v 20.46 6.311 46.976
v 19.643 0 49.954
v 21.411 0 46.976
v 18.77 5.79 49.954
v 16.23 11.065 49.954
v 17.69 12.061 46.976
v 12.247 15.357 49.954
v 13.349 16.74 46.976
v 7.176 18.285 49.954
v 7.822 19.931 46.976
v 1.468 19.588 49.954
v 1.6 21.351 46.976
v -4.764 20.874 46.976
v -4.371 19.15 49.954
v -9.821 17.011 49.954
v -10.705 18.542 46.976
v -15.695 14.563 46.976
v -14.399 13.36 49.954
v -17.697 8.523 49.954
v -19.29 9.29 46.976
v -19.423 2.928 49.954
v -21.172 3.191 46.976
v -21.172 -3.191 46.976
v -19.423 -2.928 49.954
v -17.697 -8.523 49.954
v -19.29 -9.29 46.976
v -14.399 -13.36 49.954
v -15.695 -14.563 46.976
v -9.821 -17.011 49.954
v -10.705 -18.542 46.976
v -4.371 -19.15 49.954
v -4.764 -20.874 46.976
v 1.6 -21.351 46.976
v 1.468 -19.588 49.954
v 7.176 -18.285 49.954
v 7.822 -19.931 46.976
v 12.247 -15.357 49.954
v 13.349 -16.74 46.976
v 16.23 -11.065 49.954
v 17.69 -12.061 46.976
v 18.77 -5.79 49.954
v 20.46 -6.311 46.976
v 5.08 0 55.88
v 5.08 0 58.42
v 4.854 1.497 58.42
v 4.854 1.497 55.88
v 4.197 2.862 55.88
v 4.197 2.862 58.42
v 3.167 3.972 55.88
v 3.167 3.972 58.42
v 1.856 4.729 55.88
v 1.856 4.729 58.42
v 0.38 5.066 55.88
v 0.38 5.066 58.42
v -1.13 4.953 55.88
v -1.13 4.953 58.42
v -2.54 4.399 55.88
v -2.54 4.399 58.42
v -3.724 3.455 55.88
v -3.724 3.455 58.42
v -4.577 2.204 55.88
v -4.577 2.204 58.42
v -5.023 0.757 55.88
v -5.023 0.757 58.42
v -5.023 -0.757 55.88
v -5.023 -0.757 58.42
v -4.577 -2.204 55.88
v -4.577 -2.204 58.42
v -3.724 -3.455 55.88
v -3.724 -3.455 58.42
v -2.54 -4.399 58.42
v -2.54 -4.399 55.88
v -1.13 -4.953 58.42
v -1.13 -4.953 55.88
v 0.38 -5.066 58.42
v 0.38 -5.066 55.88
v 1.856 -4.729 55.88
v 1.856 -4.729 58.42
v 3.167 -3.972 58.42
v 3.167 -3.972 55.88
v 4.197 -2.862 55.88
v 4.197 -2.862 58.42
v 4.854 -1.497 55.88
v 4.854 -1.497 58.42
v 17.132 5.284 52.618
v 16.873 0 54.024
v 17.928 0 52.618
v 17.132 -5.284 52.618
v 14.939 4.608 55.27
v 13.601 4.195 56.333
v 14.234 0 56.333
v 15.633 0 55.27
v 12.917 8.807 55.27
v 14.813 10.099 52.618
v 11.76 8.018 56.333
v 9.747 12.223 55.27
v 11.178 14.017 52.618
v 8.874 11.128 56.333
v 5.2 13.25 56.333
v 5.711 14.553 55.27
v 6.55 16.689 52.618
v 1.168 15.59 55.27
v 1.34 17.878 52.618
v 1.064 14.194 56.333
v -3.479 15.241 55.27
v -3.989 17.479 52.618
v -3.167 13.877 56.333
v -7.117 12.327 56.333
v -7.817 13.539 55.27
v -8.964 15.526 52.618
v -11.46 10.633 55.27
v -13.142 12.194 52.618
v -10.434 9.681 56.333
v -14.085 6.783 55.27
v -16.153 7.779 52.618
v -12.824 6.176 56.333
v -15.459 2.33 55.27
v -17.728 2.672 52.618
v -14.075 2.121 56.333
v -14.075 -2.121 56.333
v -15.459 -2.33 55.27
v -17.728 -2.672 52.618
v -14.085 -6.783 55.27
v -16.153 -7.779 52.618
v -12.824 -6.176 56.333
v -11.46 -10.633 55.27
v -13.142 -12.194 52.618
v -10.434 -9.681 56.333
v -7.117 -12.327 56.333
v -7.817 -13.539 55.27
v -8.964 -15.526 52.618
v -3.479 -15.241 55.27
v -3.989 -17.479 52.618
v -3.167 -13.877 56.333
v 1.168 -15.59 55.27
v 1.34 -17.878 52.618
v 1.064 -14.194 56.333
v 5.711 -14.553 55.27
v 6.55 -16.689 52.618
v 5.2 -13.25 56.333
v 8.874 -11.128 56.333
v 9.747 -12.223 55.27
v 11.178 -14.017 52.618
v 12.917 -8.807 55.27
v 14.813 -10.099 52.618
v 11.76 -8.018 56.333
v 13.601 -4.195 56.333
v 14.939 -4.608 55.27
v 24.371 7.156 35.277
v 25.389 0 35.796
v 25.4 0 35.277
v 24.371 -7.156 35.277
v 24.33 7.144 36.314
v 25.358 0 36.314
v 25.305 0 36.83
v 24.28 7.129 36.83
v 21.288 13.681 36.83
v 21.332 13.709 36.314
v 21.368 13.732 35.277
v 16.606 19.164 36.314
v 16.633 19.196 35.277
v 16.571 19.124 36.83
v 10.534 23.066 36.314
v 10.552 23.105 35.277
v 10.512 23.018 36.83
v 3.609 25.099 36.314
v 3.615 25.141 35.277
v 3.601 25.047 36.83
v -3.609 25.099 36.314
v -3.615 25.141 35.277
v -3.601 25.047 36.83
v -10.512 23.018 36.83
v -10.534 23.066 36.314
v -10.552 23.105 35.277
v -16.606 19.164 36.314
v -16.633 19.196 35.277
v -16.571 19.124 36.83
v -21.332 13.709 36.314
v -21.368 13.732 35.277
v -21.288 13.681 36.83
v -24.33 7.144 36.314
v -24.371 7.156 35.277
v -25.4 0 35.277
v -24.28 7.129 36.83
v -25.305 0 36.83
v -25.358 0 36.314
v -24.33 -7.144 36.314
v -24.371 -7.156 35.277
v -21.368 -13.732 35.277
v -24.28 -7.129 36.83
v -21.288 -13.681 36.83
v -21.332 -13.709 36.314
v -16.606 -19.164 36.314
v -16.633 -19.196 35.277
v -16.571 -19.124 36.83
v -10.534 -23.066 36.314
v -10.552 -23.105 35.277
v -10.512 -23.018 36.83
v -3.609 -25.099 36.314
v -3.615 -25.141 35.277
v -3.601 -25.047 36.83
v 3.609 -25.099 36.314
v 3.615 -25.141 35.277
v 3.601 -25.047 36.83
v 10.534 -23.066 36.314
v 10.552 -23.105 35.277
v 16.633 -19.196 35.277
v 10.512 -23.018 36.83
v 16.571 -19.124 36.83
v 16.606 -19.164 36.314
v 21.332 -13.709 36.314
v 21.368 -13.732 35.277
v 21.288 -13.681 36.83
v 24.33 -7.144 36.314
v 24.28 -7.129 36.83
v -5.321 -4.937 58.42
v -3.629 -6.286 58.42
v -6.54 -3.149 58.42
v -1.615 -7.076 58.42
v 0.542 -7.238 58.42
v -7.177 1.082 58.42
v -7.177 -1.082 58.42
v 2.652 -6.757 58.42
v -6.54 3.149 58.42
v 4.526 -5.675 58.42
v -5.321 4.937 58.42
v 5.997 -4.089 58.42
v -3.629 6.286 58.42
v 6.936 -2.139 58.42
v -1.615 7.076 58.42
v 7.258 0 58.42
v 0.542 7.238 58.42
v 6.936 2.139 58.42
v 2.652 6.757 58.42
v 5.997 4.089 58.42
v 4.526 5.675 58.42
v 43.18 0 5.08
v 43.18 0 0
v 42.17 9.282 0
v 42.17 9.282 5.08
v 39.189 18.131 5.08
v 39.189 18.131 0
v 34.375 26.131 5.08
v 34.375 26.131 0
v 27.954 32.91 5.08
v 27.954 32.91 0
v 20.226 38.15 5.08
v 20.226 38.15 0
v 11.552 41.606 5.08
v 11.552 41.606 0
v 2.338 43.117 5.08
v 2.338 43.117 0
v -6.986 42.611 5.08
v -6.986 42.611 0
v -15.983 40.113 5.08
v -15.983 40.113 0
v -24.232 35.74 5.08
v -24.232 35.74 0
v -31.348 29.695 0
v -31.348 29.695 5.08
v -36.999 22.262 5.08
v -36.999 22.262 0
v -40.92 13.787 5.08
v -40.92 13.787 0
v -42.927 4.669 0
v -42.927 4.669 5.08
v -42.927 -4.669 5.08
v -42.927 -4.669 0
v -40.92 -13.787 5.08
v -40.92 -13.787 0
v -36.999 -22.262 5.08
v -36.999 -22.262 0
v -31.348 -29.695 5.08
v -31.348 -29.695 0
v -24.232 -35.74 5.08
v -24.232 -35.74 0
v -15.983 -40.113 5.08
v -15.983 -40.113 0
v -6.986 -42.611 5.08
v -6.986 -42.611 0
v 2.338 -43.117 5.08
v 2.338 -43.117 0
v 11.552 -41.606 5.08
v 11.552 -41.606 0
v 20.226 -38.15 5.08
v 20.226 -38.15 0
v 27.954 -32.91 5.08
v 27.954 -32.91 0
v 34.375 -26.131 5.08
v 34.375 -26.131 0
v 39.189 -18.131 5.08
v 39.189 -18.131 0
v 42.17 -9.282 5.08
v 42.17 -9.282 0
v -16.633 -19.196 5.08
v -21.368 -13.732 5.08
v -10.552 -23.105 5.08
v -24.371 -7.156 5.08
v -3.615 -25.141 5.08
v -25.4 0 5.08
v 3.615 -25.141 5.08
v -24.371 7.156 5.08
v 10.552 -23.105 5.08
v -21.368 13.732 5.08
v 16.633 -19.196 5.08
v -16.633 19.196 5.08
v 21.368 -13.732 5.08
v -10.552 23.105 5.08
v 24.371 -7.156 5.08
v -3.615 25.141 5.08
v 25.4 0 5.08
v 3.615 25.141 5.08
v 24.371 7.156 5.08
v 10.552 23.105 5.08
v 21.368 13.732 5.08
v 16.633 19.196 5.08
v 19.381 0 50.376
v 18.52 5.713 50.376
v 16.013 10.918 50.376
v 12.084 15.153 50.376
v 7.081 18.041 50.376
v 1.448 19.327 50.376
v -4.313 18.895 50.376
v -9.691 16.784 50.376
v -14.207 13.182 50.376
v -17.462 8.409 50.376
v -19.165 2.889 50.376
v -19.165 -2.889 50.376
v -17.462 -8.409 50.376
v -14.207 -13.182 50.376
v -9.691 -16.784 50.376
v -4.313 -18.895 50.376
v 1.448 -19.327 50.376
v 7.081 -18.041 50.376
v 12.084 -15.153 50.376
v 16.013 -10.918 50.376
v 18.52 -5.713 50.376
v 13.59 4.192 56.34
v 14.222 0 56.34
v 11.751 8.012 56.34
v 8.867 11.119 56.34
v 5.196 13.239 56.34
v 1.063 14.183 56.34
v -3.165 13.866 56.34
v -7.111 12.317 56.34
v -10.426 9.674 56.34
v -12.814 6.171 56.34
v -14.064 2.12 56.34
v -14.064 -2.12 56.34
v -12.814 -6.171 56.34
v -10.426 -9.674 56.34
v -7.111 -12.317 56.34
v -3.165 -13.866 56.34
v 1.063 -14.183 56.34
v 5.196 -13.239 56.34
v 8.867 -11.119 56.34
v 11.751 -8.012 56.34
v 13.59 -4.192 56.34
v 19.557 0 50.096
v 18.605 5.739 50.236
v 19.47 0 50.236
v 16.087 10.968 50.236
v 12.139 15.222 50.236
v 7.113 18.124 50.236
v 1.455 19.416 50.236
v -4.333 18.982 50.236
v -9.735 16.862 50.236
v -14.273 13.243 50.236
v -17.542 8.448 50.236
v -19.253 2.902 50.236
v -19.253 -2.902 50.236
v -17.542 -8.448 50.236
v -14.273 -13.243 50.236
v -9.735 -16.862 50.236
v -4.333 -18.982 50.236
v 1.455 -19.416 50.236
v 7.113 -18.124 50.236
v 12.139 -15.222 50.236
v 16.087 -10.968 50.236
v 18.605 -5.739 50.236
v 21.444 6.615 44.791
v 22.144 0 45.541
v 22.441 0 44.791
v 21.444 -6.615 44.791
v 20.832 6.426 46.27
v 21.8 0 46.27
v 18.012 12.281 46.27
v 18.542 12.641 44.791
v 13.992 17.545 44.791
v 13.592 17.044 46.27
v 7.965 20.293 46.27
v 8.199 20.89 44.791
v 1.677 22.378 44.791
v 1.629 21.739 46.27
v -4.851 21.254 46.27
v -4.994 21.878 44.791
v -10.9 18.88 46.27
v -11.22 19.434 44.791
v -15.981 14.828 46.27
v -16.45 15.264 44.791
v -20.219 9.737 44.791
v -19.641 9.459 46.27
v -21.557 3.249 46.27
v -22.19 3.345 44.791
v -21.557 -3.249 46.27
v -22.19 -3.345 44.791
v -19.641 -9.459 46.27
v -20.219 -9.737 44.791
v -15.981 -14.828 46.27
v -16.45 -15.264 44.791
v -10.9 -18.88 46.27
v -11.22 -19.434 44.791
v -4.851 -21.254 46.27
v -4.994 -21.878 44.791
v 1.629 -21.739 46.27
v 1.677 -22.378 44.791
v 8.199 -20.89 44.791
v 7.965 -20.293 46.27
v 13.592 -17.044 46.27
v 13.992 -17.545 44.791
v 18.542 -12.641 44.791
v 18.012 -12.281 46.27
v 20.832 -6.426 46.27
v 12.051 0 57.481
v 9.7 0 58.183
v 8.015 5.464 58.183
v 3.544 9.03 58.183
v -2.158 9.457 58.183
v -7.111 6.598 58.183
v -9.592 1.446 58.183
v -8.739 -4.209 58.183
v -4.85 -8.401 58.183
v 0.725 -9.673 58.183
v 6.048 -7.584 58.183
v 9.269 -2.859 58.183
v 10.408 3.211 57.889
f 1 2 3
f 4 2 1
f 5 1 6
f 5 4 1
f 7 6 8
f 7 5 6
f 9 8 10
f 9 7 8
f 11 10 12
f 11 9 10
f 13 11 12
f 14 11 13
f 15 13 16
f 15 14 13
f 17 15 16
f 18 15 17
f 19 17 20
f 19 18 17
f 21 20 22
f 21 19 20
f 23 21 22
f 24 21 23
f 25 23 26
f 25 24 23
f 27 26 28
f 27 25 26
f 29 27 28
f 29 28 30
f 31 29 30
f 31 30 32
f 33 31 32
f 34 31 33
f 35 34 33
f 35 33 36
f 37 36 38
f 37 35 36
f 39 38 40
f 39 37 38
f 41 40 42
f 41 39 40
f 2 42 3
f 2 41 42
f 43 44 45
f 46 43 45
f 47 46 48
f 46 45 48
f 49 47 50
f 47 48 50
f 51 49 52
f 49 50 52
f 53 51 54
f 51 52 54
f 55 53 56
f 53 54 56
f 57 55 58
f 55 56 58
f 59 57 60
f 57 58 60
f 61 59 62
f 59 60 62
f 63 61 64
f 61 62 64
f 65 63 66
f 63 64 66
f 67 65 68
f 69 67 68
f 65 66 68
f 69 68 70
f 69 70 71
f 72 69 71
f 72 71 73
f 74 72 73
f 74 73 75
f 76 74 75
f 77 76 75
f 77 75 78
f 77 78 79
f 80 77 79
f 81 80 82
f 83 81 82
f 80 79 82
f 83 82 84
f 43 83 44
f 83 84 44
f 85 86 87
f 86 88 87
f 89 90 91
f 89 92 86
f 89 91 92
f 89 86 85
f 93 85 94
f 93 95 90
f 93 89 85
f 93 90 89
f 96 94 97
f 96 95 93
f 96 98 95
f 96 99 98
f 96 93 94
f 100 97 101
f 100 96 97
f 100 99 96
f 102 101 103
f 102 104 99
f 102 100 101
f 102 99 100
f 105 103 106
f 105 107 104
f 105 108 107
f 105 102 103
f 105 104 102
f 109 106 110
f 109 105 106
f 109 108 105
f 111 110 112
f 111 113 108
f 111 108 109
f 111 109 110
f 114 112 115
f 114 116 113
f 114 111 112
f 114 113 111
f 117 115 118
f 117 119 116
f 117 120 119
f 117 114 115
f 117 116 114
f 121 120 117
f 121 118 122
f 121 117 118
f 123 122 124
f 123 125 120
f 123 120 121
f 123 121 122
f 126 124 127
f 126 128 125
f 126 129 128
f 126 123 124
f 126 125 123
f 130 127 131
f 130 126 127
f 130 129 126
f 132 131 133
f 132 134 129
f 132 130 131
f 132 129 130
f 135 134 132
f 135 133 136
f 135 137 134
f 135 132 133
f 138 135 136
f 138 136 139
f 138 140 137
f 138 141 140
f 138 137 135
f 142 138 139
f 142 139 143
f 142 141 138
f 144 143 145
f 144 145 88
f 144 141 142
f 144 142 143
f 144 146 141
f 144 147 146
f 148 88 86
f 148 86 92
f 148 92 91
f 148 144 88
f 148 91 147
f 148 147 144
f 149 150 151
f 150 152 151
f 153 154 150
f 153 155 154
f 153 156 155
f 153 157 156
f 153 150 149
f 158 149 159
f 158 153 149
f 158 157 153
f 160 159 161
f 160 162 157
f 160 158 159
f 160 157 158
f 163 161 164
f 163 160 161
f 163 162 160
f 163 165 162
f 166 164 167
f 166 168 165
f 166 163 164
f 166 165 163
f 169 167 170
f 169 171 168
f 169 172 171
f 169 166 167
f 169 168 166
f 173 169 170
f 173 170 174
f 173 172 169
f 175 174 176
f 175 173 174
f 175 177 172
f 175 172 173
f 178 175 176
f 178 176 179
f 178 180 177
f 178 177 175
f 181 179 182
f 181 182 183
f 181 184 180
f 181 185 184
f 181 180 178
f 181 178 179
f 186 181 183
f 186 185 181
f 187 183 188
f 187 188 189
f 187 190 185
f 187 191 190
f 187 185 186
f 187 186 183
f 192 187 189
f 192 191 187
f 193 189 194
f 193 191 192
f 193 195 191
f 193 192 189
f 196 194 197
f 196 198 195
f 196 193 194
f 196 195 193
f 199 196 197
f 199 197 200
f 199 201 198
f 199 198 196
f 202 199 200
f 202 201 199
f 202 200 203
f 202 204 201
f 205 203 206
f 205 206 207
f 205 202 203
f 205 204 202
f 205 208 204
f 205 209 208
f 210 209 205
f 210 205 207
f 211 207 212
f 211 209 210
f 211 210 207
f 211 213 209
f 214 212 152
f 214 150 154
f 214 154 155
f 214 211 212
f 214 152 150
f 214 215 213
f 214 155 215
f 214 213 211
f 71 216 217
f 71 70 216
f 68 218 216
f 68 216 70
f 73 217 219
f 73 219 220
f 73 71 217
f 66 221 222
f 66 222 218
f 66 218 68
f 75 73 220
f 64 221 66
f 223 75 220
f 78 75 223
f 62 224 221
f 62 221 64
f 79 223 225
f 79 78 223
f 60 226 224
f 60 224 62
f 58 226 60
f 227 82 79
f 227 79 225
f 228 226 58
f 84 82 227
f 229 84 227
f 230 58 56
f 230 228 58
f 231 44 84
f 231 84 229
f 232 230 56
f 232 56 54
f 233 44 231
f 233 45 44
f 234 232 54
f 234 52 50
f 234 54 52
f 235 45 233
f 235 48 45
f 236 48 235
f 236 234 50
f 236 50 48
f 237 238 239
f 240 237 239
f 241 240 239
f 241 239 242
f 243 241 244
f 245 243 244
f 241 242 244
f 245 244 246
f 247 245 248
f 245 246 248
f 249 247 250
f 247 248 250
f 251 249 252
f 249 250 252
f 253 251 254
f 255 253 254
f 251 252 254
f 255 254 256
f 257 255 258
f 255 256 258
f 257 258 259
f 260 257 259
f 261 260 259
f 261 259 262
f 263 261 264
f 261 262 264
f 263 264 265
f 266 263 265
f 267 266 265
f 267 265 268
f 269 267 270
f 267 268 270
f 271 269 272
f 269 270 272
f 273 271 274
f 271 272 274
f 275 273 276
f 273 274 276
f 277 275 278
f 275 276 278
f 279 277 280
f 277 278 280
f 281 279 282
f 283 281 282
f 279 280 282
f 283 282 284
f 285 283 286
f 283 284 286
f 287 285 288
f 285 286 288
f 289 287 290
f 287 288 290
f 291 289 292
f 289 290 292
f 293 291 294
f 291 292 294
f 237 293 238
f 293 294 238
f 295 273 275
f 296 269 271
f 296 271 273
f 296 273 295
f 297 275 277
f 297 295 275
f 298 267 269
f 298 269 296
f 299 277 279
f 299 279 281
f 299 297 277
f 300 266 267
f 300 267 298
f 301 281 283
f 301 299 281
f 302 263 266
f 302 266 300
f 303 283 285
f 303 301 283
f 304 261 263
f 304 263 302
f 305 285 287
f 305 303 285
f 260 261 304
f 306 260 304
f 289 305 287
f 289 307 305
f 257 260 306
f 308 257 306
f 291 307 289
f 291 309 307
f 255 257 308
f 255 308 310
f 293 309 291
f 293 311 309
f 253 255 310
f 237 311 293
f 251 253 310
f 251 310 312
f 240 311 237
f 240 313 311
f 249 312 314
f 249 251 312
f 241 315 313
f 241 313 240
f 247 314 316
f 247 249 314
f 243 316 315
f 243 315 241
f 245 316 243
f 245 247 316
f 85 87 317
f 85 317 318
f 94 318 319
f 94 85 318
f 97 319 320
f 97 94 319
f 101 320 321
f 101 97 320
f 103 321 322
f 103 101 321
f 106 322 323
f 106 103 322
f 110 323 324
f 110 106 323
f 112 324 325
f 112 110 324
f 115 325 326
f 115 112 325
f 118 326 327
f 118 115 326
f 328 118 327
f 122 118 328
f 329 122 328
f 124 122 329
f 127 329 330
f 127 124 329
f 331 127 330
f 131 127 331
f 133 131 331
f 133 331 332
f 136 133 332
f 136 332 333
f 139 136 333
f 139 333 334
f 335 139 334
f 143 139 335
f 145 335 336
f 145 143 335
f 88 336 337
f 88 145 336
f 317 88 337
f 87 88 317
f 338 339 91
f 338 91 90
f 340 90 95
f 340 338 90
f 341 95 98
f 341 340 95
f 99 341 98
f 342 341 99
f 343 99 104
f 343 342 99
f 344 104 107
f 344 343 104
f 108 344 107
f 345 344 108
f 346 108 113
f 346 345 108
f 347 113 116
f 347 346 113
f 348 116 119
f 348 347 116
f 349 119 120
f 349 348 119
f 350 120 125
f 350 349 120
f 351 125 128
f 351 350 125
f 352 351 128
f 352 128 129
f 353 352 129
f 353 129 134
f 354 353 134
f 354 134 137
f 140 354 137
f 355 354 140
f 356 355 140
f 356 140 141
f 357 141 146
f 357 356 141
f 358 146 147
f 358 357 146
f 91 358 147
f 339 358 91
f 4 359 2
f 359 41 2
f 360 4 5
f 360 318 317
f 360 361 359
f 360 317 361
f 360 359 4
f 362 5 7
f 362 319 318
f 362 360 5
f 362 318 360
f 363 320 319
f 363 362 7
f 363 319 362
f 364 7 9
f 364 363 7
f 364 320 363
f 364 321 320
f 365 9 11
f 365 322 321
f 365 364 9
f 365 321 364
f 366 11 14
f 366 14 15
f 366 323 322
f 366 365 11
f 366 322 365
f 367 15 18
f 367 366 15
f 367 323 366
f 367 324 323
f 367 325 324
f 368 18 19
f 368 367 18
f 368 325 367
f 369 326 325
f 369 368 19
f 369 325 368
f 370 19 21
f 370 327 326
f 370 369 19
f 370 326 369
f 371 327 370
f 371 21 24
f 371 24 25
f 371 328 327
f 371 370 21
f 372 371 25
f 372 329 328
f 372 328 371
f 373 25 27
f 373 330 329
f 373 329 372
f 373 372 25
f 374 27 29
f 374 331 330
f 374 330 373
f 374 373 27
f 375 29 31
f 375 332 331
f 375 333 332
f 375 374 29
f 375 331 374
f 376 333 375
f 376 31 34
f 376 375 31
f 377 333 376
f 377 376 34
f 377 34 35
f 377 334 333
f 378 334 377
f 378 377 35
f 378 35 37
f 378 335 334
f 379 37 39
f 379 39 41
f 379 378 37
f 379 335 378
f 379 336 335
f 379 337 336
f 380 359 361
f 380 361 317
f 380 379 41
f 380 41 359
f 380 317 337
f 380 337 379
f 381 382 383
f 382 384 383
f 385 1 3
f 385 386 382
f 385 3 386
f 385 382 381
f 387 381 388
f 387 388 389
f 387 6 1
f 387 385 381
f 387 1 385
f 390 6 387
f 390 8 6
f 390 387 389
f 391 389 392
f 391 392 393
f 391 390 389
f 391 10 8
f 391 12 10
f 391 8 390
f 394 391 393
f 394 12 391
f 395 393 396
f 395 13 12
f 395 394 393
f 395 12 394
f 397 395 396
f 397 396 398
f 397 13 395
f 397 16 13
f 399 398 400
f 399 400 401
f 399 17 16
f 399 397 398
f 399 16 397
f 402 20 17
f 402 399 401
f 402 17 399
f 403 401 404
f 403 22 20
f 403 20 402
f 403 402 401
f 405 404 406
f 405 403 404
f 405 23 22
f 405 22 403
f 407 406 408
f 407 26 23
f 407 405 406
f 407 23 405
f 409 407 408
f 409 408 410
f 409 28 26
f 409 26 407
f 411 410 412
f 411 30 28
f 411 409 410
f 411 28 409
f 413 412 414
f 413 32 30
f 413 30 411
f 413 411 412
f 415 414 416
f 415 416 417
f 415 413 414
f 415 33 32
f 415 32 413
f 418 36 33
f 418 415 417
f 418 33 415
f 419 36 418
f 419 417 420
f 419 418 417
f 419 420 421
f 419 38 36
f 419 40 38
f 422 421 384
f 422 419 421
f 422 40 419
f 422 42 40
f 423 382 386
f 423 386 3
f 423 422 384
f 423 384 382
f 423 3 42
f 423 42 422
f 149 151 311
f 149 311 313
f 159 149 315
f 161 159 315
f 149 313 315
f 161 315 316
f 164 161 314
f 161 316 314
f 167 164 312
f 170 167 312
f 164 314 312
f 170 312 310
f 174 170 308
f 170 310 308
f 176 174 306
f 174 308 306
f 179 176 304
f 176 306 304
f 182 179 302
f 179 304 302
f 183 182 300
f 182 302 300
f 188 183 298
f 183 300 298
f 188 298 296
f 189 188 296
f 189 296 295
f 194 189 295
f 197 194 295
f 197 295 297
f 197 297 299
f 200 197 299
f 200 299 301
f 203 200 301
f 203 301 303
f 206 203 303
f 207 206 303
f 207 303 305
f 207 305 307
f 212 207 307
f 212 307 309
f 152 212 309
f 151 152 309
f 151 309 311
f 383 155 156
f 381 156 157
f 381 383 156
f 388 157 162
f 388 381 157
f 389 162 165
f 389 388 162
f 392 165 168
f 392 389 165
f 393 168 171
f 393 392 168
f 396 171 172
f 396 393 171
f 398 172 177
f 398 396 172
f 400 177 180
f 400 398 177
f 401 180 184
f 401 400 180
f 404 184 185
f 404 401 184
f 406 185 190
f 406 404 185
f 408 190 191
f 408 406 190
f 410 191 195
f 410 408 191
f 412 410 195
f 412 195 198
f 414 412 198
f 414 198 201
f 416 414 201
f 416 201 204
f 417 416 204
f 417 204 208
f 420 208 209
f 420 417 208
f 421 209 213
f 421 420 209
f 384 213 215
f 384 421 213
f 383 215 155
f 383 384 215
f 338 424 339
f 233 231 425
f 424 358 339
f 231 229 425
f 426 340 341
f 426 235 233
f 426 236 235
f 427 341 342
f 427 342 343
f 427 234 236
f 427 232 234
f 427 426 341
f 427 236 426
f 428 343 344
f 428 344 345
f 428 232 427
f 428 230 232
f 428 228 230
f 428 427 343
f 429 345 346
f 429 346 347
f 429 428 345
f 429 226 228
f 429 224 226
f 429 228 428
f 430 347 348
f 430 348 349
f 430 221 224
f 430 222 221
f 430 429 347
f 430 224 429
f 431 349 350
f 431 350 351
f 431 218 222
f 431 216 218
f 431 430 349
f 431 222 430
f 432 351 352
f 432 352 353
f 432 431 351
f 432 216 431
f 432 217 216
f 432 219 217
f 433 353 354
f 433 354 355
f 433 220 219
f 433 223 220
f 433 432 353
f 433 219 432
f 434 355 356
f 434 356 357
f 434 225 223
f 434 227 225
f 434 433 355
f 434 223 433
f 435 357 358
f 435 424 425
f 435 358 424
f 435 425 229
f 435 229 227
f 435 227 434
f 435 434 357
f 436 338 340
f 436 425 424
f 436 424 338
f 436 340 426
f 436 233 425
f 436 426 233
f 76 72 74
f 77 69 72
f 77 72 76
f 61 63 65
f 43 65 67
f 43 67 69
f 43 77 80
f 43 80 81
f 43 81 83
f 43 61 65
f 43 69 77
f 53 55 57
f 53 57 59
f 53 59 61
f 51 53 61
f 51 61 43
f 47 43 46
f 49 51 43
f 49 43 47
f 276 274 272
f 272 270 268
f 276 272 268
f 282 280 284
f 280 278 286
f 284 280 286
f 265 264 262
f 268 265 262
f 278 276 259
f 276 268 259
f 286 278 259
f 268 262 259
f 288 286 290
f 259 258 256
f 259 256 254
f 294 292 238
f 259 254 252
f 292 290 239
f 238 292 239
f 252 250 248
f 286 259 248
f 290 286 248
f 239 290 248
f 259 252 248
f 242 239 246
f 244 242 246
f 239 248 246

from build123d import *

# Parameters (mm, degrees)
F0_R     = 43.18
F0_R_2   = 25.4
F1_DEPTH = 5.08
F2_DEPTH = 36.83
F6_R     = 5.08
F7_DEPTH = 2.54


# Not quite as in the source:
# - a fillet or chamfer that OpenCascade refuses, or shapes differently, is made with other operations: its cross-section is extruded or revolved along the edge and cut away or added


with BuildPart() as f1:
    # F0 (on Top) → F1 (new body)
    with BuildSketch(Plane.XY):
        Circle(F0_R)
        Circle(F0_R_2, mode=Mode.SUBTRACT)
    extrude(amount=F1_DEPTH)

    # F0 (on Top) → F2 (join)
    with BuildSketch(Plane.XY):
        Circle(F0_R_2)
    extrude(amount=F2_DEPTH)

    # F3 (on Front) → F4 (revolve)
    with BuildSketch(Plane.XZ):
        Polygon((0, 58.42), (0, 36.8297025561), (25.3384895623, 36.7359854281), (22.0302641392, 45.9328517318), (19.5160117, 50.1673817635), (16.4724439383, 54.8650622368), (11.0508995131, 58.42), align=None)
    revolve(axis=Axis((0, 0, 47.6248512781), (0, 0, 1)))

    # F5: fillet of radius 12.7 on 5 edges, made by hand

    # F5_s1 → F5_t2 (revolve, cut)
    with BuildSketch(Plane.XZ):
        with BuildLine():
            ThreePointArc((25.4, 35.2768549118), (25.3761454392, 36.0548888463), (25.3046713696, 36.83))
            Line((25.3046713696, 36.83), (25.4, 36.83))
            Line((25.4, 36.83), (25.4, 35.2768549118))
        make_face()
    revolve(axis=Axis((0, 0, 36.83), (0, 0, 1)), mode=Mode.SUBTRACT)

    # F5_s3 → F5_t4 (revolve, cut)
    with BuildSketch(Plane.XZ):
        with BuildLine():
            ThreePointArc((19.6427134925, 49.9539892906), (19.513951513, 50.166103437), (19.3810699459, 50.3756614184))
            Line((19.3810699459, 50.3756614184), (19.5160117, 50.1673817635))
            Line((19.5160117, 50.1673817635), (19.6427134925, 49.9539892906))
        make_face()
    revolve(axis=Axis((0, 0, 50.1673817635), (0, 0, 1)), mode=Mode.SUBTRACT)

    # F5_s5 → F5_t6 (revolve, cut)
    with BuildSketch(Plane.XZ):
        with BuildLine():
            ThreePointArc((22.4409800917, 44.79106143), (21.9779508662, 45.9081881165), (21.4107694035, 46.9762111901))
            Line((21.4107694035, 46.9762111901), (22.0302641392, 45.9328517318))
            Line((22.0302641392, 45.9328517318), (22.4409800917, 44.79106143))
        make_face()
    revolve(axis=Axis((0, 0, 45.9328517318), (0, 0, 1)), mode=Mode.SUBTRACT)

    # F5_s7 → F5_t8 (revolve, cut)
    with BuildSketch(Plane.XZ):
        with BuildLine():
            ThreePointArc((17.9281816755, 52.6181627827), (16.274530798, 54.6682321185), (14.2335662066, 56.3331072017))
            Line((14.2335662066, 56.3331072017), (16.4724439383, 54.8650622368))
            Line((16.4724439383, 54.8650622368), (17.9281816755, 52.6181627827))
        make_face()
    revolve(axis=Axis((0, 0, 54.8650622368), (0, 0, 1)), mode=Mode.SUBTRACT)

    # F5_s9 → F5_t10 (revolve, cut)
    with BuildSketch(Plane.XZ):
        with BuildLine():
            ThreePointArc((14.2223539104, 56.3404591686), (10.8923380013, 57.8890145748), (7.2584579428, 58.42))
            Line((7.2584579428, 58.42), (11.0508995131, 58.42))
            Line((11.0508995131, 58.42), (14.2223539104, 56.3404591686))
        make_face()
    revolve(axis=Axis((0, 0, 58.42), (0, 0, 1)), mode=Mode.SUBTRACT)

    # F6 (on face) → F7 (cut)
    with BuildSketch(Plane.XY.offset(58.42)):
        Circle(F6_R)
    extrude(amount=-F7_DEPTH, mode=Mode.SUBTRACT)


solid = f1.part
